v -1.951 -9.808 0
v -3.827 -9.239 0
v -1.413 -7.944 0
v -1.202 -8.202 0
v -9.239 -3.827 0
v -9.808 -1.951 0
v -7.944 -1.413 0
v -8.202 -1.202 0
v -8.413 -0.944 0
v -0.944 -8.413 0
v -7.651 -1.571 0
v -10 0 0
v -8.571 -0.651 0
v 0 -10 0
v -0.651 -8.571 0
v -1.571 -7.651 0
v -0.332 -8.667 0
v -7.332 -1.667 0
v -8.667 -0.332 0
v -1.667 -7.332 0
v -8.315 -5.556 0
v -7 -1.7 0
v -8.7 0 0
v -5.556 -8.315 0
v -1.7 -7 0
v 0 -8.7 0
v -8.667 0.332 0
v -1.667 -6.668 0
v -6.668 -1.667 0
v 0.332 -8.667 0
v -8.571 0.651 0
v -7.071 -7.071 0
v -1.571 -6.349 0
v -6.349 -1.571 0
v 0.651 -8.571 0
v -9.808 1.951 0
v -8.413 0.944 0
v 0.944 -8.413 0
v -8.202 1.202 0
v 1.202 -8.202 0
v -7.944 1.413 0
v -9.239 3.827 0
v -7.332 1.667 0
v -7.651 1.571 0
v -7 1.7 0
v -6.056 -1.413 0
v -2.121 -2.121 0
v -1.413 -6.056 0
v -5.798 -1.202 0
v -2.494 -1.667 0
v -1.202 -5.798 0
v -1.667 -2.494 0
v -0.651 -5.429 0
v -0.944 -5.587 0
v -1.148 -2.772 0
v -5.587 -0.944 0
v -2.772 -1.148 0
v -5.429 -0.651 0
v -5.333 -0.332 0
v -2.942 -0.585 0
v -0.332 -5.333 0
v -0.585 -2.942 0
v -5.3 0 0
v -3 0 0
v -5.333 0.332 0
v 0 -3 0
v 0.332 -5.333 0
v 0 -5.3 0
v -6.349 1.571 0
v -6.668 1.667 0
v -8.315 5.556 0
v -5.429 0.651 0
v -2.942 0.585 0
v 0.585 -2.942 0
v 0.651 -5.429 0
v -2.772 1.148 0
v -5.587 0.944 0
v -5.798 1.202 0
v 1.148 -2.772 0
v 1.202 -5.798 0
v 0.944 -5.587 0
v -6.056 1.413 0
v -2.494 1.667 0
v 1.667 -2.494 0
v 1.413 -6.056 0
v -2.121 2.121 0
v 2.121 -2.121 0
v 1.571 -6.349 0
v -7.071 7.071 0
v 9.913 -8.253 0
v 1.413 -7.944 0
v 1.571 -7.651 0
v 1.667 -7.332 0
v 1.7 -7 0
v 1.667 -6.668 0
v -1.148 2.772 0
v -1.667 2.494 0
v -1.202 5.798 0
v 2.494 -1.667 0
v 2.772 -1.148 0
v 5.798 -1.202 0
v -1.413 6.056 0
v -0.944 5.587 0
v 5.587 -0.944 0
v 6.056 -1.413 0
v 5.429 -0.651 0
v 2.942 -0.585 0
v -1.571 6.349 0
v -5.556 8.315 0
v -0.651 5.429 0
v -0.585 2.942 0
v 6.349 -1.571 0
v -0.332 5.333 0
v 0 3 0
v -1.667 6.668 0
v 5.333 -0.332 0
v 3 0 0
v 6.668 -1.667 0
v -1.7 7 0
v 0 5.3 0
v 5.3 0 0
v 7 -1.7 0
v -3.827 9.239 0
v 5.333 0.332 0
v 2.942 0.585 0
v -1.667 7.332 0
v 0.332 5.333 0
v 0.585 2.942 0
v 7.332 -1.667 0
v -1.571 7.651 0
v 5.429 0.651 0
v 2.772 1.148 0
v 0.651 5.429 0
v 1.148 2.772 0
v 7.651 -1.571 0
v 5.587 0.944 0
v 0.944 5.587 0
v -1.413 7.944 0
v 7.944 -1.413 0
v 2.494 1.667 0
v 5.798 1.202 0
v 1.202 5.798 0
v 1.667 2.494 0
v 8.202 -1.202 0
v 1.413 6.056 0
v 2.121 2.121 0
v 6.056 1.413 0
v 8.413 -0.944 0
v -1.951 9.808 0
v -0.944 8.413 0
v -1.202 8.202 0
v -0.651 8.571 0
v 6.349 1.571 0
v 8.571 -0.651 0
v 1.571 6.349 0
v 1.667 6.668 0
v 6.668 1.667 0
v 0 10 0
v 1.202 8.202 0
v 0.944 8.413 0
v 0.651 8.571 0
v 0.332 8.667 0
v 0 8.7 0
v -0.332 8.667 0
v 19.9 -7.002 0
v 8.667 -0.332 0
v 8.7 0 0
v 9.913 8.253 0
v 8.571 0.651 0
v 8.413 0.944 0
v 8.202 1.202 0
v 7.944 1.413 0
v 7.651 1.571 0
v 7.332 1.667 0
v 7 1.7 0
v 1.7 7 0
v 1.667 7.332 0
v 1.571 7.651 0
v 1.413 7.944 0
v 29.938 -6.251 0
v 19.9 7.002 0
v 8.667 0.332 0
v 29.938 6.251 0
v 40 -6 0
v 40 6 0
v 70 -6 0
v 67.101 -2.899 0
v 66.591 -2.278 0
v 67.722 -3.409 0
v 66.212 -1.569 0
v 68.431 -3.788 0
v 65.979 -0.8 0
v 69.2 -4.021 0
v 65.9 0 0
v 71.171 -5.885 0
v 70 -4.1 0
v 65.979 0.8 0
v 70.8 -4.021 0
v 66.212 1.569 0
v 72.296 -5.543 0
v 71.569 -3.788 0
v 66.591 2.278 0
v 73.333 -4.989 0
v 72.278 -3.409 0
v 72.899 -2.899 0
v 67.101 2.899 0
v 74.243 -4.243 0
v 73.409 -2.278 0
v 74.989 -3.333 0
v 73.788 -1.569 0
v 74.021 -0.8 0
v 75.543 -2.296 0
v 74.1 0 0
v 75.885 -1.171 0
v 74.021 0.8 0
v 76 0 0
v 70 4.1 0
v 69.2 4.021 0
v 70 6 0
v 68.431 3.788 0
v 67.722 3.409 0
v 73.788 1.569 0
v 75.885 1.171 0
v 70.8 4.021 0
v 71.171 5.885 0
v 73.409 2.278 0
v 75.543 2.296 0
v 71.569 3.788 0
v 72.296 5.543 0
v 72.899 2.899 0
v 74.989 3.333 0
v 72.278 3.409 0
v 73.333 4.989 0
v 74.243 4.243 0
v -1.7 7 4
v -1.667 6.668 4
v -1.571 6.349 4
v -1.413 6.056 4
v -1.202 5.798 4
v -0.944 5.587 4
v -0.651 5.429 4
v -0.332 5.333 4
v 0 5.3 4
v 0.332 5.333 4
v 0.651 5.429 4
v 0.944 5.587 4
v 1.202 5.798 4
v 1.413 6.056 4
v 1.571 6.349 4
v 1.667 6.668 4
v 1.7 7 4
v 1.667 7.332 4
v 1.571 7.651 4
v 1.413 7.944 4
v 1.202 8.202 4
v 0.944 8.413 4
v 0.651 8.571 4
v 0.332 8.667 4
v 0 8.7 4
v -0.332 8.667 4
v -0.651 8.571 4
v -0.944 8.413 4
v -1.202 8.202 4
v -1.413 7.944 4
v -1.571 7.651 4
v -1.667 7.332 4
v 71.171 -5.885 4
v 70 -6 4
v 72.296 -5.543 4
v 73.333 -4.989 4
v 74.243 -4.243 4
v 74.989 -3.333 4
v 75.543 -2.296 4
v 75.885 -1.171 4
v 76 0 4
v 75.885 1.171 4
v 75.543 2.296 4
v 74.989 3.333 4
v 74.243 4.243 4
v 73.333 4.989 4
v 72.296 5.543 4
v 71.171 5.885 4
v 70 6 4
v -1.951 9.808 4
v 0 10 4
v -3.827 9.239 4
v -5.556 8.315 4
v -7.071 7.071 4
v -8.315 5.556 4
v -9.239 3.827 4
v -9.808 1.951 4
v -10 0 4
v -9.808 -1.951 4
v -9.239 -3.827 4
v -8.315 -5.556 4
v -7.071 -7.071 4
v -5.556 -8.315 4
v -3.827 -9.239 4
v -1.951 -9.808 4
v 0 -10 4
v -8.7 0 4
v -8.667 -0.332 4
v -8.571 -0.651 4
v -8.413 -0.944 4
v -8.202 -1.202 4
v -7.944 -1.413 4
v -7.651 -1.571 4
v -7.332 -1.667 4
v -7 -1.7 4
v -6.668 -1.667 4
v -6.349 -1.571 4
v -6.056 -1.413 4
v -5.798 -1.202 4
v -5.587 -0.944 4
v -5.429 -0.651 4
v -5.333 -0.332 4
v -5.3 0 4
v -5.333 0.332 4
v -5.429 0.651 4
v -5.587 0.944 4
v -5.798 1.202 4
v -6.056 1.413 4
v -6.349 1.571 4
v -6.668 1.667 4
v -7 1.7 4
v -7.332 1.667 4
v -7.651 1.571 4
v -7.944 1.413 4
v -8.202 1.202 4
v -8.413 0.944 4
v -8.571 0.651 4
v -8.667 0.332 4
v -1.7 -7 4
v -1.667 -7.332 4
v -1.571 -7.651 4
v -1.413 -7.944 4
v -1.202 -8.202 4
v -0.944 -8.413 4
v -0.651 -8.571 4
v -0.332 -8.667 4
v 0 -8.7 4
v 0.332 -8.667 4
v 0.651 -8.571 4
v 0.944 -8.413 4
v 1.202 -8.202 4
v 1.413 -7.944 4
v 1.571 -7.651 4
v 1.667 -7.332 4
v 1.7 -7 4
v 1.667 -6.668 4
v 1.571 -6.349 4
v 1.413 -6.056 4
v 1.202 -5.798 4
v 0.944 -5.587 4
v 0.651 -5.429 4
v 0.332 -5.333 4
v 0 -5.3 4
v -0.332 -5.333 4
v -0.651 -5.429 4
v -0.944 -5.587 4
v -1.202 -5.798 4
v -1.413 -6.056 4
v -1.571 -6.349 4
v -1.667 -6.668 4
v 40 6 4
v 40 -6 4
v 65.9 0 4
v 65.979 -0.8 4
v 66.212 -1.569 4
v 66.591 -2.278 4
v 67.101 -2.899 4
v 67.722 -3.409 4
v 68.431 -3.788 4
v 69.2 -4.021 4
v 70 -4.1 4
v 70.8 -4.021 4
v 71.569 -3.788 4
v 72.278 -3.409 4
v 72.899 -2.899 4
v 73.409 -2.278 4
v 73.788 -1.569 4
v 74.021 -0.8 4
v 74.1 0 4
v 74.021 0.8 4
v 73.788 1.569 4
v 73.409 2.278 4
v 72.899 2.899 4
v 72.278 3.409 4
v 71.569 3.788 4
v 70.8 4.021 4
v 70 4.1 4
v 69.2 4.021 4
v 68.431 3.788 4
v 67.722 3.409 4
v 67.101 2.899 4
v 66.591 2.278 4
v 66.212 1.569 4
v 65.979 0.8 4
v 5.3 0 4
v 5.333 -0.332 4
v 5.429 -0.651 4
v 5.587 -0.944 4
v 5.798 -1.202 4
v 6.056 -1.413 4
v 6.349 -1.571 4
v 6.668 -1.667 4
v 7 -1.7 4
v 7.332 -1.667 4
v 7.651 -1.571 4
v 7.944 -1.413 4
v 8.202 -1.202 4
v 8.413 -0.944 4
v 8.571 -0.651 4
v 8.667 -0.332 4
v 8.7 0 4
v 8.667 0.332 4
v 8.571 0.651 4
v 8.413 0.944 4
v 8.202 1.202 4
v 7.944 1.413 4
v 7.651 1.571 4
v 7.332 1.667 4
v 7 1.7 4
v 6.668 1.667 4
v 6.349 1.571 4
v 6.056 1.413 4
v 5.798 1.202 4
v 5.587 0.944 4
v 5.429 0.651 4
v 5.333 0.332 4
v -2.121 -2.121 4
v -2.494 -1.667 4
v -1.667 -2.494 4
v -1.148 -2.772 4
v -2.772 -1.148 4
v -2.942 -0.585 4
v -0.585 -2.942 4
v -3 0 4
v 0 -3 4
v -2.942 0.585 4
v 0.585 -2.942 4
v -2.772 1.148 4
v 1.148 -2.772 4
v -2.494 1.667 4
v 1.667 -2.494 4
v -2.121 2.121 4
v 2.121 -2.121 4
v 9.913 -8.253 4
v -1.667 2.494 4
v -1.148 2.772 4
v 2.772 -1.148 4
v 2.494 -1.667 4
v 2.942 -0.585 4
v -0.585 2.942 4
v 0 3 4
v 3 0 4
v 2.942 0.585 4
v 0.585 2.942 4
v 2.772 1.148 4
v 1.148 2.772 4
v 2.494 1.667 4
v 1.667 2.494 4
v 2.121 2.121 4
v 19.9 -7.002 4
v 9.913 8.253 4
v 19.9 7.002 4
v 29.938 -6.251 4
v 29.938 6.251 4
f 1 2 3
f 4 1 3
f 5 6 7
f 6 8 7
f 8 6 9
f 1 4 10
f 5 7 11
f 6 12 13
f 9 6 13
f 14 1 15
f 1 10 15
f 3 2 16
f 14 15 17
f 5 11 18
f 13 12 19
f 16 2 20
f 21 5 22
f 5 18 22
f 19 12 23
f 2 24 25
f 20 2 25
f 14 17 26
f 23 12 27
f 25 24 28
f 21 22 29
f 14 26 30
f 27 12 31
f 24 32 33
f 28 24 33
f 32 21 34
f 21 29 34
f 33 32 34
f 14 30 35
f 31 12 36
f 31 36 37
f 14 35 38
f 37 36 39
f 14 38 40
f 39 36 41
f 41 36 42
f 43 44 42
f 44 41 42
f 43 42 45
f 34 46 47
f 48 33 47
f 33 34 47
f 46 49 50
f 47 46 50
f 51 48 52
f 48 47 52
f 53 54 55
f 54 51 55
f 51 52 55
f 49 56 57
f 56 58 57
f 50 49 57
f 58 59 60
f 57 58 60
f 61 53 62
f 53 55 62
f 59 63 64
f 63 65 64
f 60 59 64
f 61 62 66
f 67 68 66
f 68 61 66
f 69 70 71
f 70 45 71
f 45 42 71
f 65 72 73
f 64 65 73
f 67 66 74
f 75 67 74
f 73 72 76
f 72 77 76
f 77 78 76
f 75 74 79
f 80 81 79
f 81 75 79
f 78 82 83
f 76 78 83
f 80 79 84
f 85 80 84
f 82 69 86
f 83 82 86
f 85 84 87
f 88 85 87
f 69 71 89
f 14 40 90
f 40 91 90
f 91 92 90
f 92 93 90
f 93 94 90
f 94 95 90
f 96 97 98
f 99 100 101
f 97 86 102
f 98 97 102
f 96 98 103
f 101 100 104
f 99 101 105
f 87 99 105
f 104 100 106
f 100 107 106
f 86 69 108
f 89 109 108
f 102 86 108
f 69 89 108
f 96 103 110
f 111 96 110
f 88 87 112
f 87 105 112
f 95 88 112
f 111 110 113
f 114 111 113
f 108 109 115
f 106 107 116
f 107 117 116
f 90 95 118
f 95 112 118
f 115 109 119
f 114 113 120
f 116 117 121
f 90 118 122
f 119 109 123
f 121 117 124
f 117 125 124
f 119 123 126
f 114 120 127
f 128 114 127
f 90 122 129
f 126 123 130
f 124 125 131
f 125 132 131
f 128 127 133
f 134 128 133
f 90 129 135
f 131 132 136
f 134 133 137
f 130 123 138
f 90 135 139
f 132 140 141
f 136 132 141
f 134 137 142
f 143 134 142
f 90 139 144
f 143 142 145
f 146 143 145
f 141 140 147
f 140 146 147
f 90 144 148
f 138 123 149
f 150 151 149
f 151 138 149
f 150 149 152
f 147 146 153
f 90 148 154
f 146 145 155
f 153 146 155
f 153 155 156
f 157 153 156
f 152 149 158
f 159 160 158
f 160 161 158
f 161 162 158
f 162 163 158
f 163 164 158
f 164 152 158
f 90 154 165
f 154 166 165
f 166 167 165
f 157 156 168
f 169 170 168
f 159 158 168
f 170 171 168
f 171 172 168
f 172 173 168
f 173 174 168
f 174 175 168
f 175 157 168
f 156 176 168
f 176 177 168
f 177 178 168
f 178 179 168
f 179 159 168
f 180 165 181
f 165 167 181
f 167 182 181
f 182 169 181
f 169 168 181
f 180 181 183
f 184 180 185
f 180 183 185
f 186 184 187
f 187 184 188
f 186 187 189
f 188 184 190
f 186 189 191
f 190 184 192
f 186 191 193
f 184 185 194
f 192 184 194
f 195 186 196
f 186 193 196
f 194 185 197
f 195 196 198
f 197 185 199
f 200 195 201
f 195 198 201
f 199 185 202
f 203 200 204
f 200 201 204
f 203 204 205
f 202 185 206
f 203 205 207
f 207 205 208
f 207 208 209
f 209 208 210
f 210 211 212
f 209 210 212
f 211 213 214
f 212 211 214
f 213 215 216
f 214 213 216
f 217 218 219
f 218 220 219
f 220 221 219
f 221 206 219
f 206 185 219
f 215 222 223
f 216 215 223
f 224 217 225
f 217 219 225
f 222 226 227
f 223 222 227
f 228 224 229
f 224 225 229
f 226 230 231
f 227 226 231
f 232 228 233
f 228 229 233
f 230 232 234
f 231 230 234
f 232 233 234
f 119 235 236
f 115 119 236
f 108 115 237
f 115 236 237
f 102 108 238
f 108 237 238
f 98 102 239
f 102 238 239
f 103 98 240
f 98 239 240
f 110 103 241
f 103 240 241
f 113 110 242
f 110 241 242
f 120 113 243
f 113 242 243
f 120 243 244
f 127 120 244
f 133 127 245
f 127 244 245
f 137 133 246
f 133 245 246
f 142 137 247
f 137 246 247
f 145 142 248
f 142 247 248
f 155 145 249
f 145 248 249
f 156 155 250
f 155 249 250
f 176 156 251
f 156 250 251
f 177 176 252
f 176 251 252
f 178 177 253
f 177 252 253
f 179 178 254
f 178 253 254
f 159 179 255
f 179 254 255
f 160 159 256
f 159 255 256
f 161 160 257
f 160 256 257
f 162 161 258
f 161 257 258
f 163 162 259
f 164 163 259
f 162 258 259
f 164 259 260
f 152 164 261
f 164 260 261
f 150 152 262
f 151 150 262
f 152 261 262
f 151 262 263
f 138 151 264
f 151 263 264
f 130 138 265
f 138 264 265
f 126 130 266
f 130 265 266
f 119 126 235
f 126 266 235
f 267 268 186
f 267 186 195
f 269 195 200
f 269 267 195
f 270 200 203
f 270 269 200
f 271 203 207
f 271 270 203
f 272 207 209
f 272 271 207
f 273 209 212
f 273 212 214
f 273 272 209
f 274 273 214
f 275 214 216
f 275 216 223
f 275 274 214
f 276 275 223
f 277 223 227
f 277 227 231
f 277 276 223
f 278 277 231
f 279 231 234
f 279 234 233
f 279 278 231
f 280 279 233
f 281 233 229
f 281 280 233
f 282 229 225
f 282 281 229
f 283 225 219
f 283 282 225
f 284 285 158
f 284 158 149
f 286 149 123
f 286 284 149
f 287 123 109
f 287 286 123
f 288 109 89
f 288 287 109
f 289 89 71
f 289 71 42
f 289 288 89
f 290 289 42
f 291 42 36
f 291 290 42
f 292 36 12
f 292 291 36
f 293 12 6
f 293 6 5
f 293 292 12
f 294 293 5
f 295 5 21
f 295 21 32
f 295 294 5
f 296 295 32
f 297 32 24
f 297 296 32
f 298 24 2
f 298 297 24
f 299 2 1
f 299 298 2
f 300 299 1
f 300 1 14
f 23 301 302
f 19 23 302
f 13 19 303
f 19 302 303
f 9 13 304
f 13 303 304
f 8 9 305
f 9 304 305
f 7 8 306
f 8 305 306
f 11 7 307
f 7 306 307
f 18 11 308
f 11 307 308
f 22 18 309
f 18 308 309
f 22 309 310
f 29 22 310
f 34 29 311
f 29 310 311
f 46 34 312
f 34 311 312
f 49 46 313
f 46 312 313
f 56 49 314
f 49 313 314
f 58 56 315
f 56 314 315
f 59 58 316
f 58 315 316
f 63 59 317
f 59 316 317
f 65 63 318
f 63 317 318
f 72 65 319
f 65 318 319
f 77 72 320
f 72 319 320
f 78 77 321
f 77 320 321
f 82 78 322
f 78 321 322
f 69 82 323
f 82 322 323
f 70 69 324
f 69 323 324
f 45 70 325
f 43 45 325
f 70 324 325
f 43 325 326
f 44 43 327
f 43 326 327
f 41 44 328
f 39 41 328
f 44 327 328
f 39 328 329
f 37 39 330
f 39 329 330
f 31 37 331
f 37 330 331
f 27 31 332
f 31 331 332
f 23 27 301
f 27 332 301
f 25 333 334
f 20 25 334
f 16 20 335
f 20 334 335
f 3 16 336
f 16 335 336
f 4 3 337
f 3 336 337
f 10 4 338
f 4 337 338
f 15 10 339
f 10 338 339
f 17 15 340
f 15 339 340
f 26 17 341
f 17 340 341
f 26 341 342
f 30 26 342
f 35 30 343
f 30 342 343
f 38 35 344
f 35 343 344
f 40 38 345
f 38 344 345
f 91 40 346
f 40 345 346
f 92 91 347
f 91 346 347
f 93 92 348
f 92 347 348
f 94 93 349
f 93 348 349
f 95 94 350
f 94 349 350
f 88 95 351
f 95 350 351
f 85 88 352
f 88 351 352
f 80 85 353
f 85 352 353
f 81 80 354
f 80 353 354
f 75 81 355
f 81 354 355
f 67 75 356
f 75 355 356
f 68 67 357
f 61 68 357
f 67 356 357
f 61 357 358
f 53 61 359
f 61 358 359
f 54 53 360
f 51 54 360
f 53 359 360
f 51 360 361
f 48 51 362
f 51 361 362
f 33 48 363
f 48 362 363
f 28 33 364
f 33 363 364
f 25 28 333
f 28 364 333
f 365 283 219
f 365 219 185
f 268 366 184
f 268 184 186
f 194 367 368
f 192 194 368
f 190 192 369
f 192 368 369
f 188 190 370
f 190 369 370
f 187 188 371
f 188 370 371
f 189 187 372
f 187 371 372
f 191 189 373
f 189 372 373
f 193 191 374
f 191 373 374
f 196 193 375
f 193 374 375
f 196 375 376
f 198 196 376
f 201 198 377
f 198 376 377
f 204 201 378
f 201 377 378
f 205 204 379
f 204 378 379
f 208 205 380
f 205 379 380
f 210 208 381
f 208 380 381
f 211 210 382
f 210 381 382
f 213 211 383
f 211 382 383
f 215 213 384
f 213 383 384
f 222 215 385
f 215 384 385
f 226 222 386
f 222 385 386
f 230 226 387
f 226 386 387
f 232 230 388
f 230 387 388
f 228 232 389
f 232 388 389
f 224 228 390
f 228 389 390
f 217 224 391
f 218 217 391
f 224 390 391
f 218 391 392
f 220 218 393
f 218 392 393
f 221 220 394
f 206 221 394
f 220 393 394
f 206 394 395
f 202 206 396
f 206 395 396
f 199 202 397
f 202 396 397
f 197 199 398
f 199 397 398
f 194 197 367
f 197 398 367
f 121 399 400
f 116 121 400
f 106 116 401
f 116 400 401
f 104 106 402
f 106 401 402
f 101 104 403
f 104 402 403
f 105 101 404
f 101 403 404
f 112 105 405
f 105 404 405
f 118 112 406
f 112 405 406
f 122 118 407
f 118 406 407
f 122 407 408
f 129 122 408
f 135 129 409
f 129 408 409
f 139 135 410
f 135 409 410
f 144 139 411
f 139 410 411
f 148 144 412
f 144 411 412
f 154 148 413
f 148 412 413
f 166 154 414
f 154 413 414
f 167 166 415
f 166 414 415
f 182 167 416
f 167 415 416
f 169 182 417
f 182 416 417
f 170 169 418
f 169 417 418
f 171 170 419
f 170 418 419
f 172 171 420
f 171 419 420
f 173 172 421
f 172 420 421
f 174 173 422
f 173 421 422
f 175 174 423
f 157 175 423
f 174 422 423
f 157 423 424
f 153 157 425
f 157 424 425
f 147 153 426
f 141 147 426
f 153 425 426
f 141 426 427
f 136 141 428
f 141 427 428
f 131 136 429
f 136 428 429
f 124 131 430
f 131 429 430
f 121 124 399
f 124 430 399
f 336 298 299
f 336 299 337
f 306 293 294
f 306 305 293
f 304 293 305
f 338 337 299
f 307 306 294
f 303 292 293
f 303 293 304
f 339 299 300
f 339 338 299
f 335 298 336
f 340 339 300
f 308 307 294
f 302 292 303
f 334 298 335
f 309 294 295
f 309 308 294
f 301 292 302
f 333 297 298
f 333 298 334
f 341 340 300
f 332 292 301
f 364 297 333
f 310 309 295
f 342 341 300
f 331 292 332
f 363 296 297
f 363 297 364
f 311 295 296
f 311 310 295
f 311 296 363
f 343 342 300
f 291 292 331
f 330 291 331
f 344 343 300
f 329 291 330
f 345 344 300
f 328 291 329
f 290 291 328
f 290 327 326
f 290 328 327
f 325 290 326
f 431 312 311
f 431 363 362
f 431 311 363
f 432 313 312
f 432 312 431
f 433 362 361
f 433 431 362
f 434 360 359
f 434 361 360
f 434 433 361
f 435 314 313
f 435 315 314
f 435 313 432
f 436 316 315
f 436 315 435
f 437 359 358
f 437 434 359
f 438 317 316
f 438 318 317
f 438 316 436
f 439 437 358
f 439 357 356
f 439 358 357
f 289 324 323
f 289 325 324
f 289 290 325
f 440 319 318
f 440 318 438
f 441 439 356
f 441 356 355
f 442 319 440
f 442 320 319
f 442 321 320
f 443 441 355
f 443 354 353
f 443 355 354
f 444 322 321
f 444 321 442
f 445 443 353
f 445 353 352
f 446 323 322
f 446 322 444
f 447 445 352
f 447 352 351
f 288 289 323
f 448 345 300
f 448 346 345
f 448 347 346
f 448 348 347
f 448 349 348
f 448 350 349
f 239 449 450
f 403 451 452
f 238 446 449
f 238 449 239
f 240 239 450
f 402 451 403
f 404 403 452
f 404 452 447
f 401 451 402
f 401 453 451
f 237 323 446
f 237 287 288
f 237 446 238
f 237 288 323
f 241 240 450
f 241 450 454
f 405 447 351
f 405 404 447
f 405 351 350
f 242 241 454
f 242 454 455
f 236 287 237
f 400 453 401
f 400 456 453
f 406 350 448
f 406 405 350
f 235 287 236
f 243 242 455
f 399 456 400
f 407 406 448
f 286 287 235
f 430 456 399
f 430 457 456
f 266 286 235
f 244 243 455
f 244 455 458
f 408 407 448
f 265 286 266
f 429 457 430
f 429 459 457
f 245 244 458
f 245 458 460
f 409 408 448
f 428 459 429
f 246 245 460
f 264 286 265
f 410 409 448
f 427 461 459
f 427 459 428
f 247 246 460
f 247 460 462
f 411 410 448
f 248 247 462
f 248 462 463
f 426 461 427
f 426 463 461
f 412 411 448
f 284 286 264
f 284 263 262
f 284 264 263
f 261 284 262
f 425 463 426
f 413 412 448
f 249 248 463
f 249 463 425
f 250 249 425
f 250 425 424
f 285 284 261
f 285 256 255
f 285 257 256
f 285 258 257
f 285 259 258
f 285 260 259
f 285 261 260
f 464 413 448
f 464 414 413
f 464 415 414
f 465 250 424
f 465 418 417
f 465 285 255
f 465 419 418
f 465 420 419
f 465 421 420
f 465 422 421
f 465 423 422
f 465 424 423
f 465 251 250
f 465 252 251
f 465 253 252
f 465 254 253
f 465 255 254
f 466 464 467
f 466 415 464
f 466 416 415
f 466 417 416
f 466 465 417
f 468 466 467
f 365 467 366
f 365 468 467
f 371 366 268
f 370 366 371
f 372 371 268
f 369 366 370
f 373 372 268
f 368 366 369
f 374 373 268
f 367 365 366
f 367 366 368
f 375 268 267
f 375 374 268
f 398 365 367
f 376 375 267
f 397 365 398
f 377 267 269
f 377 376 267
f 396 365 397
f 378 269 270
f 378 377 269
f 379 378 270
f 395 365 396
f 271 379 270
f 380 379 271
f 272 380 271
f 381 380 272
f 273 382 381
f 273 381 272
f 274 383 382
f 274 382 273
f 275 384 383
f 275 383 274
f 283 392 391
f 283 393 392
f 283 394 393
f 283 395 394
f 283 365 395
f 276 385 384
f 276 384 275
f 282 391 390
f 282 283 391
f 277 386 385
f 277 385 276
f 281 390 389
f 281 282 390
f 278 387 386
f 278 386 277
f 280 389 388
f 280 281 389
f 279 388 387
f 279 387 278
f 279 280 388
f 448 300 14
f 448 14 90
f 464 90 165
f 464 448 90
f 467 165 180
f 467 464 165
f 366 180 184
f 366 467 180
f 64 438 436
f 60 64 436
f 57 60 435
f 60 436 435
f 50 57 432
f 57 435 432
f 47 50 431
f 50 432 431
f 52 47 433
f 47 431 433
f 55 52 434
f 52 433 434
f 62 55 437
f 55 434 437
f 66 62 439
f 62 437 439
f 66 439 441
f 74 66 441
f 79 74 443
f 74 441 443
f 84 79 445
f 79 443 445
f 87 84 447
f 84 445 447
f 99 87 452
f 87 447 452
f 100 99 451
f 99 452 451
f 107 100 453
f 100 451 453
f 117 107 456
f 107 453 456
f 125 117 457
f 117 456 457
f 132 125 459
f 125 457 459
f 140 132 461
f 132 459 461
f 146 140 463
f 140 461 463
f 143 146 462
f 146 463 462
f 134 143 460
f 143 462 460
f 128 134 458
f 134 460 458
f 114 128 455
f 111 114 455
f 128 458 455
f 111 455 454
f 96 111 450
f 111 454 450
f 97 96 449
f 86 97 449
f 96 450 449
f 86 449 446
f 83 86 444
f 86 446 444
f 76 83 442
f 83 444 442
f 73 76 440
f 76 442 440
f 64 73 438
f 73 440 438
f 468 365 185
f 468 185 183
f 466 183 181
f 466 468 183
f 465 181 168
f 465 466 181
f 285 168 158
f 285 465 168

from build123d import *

# Parameters (mm, degrees)
SKETCH_1_R      = 1.7
SKETCH_1_R_2    = 3
SKETCH_1_R_3    = 4.1
EXTRUDE_1_DEPTH = 4


with BuildPart() as part:
    # 草图1 → 凸台-拉伸1 (new body)
    with BuildSketch(Plane.XY.offset(4)):
        with BuildLine():
            Line((40, -6), (70, -6))
            ThreePointArc((70, -6), (76.000000116, 1.16e-07), (70, 6.000000233))
            Line((70, 6.000000233), (39.999998847, 6.000000233))
            ThreePointArc((39.999998847, 6.000000233), (19.900249653, 7.002487606), (2.882e-06, 9.999999418))
            ThreePointArc((2.882e-06, 9.999999418), (-9.999999709, 1.15e-06), (0, -10))
            ThreePointArc((0, -10), (19.900248758, -7.002487578), (40, -6))
        make_face()
        with Locations(Location((0, 7, 0), (0, 0, 180))):
            Circle(SKETCH_1_R, mode=Mode.SUBTRACT)
        with Locations(Location((0, -2.91e-07, 0), (0, 0, 180))):
            Circle(SKETCH_1_R_2, mode=Mode.SUBTRACT)
        with Locations(Location((-7, 0, 0), (0, 0, 180))):
            Circle(SKETCH_1_R, mode=Mode.SUBTRACT)
        with Locations(Location((0, -7, 0), (0, 0, 180))):
            Circle(SKETCH_1_R, mode=Mode.SUBTRACT)
        with Locations(Location((7, 0, 0), (0, 0, 180))):
            Circle(SKETCH_1_R, mode=Mode.SUBTRACT)
        with Locations(Location((70, 1.16e-07, 0), (0, 0, 180))):
            Circle(SKETCH_1_R_3, mode=Mode.SUBTRACT)
    extrude(amount=-EXTRUDE_1_DEPTH)


solid = part.part
